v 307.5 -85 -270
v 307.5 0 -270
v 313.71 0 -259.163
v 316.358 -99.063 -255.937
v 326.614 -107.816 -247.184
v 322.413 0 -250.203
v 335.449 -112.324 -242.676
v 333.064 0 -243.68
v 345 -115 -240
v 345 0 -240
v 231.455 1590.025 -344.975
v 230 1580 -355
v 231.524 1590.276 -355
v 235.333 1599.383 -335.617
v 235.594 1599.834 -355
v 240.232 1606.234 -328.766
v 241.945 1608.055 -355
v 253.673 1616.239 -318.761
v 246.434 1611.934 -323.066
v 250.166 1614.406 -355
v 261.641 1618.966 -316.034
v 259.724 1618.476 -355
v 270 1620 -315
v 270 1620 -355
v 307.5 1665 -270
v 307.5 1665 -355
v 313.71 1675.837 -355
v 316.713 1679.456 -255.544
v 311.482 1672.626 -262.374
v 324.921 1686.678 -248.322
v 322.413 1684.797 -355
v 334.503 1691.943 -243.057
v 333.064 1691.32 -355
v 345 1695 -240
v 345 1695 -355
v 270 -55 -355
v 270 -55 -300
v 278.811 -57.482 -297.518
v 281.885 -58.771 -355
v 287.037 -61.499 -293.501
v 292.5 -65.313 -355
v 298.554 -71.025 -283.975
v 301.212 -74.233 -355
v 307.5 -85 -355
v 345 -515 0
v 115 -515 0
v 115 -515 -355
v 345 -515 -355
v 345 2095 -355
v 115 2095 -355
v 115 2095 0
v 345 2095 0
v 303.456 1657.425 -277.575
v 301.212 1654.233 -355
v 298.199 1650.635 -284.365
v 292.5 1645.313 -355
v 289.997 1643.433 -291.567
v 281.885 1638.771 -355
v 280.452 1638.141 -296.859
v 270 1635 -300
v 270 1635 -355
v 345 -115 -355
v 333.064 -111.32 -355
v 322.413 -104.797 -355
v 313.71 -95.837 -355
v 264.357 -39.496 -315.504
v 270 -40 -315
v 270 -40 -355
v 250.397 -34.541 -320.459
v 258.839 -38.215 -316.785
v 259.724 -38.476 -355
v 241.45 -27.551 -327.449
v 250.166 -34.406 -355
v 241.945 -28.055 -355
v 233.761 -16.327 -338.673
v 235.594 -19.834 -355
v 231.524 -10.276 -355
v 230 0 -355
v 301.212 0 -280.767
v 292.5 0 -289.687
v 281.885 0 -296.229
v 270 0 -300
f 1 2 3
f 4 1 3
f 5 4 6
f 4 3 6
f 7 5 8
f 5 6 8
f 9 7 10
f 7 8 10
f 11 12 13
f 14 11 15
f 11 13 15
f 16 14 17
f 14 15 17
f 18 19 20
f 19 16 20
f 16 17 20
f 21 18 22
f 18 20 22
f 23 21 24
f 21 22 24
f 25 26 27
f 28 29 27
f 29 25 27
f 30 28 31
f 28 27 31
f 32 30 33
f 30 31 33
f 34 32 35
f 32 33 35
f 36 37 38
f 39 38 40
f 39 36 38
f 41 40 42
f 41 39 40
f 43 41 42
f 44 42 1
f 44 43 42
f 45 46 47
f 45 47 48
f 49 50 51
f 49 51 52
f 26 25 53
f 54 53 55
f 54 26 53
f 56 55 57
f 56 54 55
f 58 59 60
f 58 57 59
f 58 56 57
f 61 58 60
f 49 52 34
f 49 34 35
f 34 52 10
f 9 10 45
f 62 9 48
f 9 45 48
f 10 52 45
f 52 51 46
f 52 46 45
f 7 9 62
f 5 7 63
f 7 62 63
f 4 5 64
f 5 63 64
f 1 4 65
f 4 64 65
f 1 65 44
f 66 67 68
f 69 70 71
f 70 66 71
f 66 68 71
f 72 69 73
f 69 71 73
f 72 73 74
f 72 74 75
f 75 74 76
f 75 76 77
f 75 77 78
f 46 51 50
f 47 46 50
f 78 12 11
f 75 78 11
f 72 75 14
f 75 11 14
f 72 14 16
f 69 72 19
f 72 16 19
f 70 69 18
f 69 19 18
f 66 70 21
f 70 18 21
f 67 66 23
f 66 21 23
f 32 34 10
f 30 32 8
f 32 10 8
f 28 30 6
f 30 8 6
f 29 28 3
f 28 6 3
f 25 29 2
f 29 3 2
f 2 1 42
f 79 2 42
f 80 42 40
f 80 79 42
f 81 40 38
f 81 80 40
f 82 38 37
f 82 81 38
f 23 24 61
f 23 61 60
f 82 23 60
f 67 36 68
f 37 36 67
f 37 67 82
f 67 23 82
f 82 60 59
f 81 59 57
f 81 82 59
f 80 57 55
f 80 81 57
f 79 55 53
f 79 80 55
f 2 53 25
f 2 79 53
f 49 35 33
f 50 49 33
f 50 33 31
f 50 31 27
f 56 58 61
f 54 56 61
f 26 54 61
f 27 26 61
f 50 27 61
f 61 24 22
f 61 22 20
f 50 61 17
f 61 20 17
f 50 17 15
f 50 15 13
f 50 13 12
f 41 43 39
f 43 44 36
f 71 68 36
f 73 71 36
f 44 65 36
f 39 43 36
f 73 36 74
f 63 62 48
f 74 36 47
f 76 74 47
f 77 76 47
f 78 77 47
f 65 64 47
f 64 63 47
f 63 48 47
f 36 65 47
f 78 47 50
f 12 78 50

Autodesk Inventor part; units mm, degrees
ref_plane "YZ Plane" through (0, 0, 0) normal (1, 0, 0) x (0, 1, 0)
ref_plane "XZ Plane" through (0, 0, 0) normal (0, 1, 0) x (-1, 0, 0)
ref_plane "XY Plane" through (0, 0, 0) normal (0, 0, 1) x (1, 0, 0)
sketch "Sketch1" plane through (0, 0, 0) normal (0, 1, 0) x (-1, 0, 0)
  line L0 (0, 0) -> (0, -300)
  line L1 (0, -300) -> (-115, -300)
  line L2 (-115, -300) -> (-115, -355)
  line L3 (-115, -355) -> (-230, -355)
  line L4 (-230, -355) -> (-345, -355) construction
  line L5 (0, 0) -> (-345, 0)
  line L6 (-345, 0) -> (-345, -240)
  line L7 (-270, -300) -> (-270, -315)
  line L8 (-345, -240) -> (-270, -300) construction
  line L9 (-307.5, -270) -> (-270, -300) construction
  line L10 (-307.5, -270) -> (-345, -240) construction
  arc A0 (-307.5, -270) -> (-270, -300) centre (-260.624645, -249.843306) ccw
  arc A1 (-307.5, -270) -> (-345, -240) centre (-353.647258, -289.246573) ccw
  arc A2 (-230, -355) -> (-270, -315) centre (-270.80177, -355.80177) ccw
  point P0 (-288.75, -285)
  point P1 (-326.25, -255)
  dimension "d0" = 300
  dimension "d1" = 115
  dimension "d2" = 55
  dimension "d3" = 115
  dimension "d4" = 115
  dimension "d5" = 345
  dimension "d7" = 15
  dimension "d8" = 155
  dimension "d9" = 40
  dimension "d13" = 50
  dimension "d14" = 50
  dimension "d16" = 62.5
  dimension "d19" = 60
extrude "Extrusion1" add sketch "Sketch1" along normal blind 299
sketch "Sketch2" plane through (0, 299, 0) normal (0, 1, 0) x (1, 0, 0)
  line L0 (230, 355) -> (115, 355)
  line L1 (115, 355) -> (115, 300)
  line L2 (115, 300) -> (0, 300)
  line L3 (0, 300) -> (0, 0)
  line L4 (0, 0) -> (345, 0)
  line L5 (345, 0) -> (345, 240)
  arc A0 (307.5, 270) -> (345, 240) centre (353.647258, 289.246573) ccw
  arc A1 (307.5, 270) -> (270, 300) centre (260.624645, 249.843306) ccw
  line L6 (270, 300) -> (270, 315)
  arc A2 (230, 355) -> (270, 315) centre (270.80177, 355.80177) ccw
extrude "Extrusion2" add sketch "Sketch2" along normal blind 1281
sketch "Sketch3" plane through (0, 0, 0) normal (0, -1, 0) x (1, 0, 0)
  line L0 (230, -355) -> (115, -355) projected
  line L1 (115, -355) -> (115, -300) projected
  line L2 (115, -300) -> (0, -300) projected
  line L3 (0, -300) -> (0, 0) projected
  line L4 (0, 0) -> (345, 0) projected
  line L5 (345, 0) -> (345, -240) projected
  line L6 (230, -355) -> (345, -355)
  line L7 (345, -355) -> (345, -240)
extrude "Extrusion3" add sketch "Sketch3" along normal blind 515
sketch "Sketch4" plane through (0, 1580, 0) normal (0, 1, 0) x (1, 0, 0)
  line L0 (345, 0) -> (345, 240) projected
  line L1 (0, 0) -> (345, 0) projected
  line L2 (0, 300) -> (0, 0) projected
  line L3 (115, 300) -> (0, 300) projected
  line L4 (115, 355) -> (115, 300) projected
  line L5 (345, 355) -> (345, 240) projected
  line L6 (345, 240) -> (345, 355)
  line L7 (345, 355) -> (115, 355)
extrude "Extrusion4" add sketch "Sketch4" along normal blind 515
sketch "Sketch5" plane through (0, 1580, 0) normal (0, -1, 0) x (1, 0, 0)
  arc A0 (270, -315) -> (230, -355) centre (270.80177, -355.80177) ccw
  line L0 (345, -355) -> (230, -355)
  line L1 (345, -240) -> (345, -355)
  arc A1 (345, -240) -> (307.5, -270) centre (353.647258, -289.246573) ccw
  arc A2 (270, -300) -> (307.5, -270) centre (260.624645, -249.843306) ccw
  line L2 (270, -300) -> (270, -315)
  line L3 (424.37671, -355) -> (-70.729452, -355)
  point P0 (0, 0)
revolve "Revolution1" cut sketch "Sketch5" angle 360 about axis through (345, 1580, -355) along (-1, 0, 0)
sketch "Sketch6" plane through (0, 0, 0) normal (0, 1, 0) x (1, 0, 0)
  arc A0 (307.5, 270) -> (345, 240) centre (353.647258, 289.246573) ccw
  line L0 (345, 355) -> (345, 240)
  line L1 (230, 355) -> (345, 355)
  arc A1 (230, 355) -> (270, 315) centre (270.80177, 355.80177) ccw
  line L2 (270, 300) -> (270, 315)
  arc A2 (307.5, 270) -> (270, 300) centre (260.624645, 249.843306) ccw
  line L3 (-70.729452, 355) -> (424.37671, 355)
  point P0 (0, 0)
revolve "Revolution2" cut sketch "Sketch6" angle 360 about axis through (115, 0, -355) along (1, 0, 0)
sketch "Sketch12" plane through (345, -515, -355) normal (0, 0, -1) x (-1, 0, 0)
  arc A0 (0, 400) -> (37.5, 430) centre (-8.647258, 449.246573) ccw
  arc A1 (75, 460) -> (37.5, 430) centre (84.375355, 409.843306) ccw
  line L0 (75, 475) -> (75, 460)
  arc A2 (75, 475) -> (115, 515) centre (74.19823, 515.80177) ccw
  line L1 (0, 515) -> (37.5, 515)
  line L2 (75, 515) -> (37.5, 515)
  line L3 (75, 515) -> (115, 515)
  line L4 (0, 400) -> (0, 515)
  point P0 (345, 515)
extrude "Extrusion10" cut sketch "Sketch12" against normal blind 115
sketch "Sketch13" plane through (345, -515, -355) normal (0, 0, -1) x (-1, 0, 0)
  arc A0 (115, 2095) -> (75, 2135) centre (74.19823, 2094.19823) ccw
  line L0 (75, 2150) -> (75, 2135)
  arc A1 (37.5, 2180) -> (75, 2150) centre (84.375355, 2200.156694) ccw
  arc A2 (37.5, 2180) -> (0, 2210) centre (-8.647258, 2160.753427) ccw
  line L1 (0, 2095) -> (0, 2210)
  line L2 (0, 2095) -> (37.5, 2095)
  line L3 (75, 2095) -> (37.5, 2095)
  line L4 (75, 2095) -> (115, 2095)
  point P0 (345, 515)
extrude "Extrusion11" cut sketch "Sketch13" against normal blind 115
sketch "Sketch14" plane through (230, 0, -240) normal (0, -1, 0) x (1, 0, 0)
  arc A0 (40, -75) -> (0, -115) centre (40.80177, -115.80177) ccw
  line L0 (40, -60) -> (40, -75)
  arc A1 (40, -60) -> (77.5, -30) centre (30.624645, -9.843306) ccw
  arc A2 (115, 0) -> (77.5, -30) centre (123.647258, -49.246573) ccw
  line L1 (115, 0) -> (0, 0)
  line L2 (0, -115) -> (0, 0)
  point P0 (-230, 240)
extrude "Extrusion12" add sketch "Sketch14" along normal up to next
sketch "Sketch15" plane through (230, 1580, -240) normal (0, 1, 0) x (1, 0, 0)
  arc A0 (77.5, 30) -> (115, 0) centre (123.647258, 49.246573) ccw
  arc A1 (77.5, 30) -> (40, 60) centre (30.624645, 9.843306) ccw
  line L0 (40, 75) -> (40, 60)
  arc A2 (0, 115) -> (40, 75) centre (40.80177, 115.80177) ccw
  line L1 (0, 115) -> (0, 0)
  line L2 (0, 0) -> (115, 0)
  point P0 (-230, -240)
extrude "Extrusion13" add sketch "Sketch15" along normal up to next
sketch "Sketch16" plane through (0, -515, 0) normal (0, -1, 0) x (1, 0, 0)
  line L0 (0, -300) -> (115, -300) projected
  line L1 (0, 0) -> (0, -300) projected
  line L2 (0, 0) -> (115, 0)
  line L3 (115, 0) -> (115, -300)
extrude "Extrusion14" cut sketch "Sketch16" against normal through all
properties part number "Base Drawing"
